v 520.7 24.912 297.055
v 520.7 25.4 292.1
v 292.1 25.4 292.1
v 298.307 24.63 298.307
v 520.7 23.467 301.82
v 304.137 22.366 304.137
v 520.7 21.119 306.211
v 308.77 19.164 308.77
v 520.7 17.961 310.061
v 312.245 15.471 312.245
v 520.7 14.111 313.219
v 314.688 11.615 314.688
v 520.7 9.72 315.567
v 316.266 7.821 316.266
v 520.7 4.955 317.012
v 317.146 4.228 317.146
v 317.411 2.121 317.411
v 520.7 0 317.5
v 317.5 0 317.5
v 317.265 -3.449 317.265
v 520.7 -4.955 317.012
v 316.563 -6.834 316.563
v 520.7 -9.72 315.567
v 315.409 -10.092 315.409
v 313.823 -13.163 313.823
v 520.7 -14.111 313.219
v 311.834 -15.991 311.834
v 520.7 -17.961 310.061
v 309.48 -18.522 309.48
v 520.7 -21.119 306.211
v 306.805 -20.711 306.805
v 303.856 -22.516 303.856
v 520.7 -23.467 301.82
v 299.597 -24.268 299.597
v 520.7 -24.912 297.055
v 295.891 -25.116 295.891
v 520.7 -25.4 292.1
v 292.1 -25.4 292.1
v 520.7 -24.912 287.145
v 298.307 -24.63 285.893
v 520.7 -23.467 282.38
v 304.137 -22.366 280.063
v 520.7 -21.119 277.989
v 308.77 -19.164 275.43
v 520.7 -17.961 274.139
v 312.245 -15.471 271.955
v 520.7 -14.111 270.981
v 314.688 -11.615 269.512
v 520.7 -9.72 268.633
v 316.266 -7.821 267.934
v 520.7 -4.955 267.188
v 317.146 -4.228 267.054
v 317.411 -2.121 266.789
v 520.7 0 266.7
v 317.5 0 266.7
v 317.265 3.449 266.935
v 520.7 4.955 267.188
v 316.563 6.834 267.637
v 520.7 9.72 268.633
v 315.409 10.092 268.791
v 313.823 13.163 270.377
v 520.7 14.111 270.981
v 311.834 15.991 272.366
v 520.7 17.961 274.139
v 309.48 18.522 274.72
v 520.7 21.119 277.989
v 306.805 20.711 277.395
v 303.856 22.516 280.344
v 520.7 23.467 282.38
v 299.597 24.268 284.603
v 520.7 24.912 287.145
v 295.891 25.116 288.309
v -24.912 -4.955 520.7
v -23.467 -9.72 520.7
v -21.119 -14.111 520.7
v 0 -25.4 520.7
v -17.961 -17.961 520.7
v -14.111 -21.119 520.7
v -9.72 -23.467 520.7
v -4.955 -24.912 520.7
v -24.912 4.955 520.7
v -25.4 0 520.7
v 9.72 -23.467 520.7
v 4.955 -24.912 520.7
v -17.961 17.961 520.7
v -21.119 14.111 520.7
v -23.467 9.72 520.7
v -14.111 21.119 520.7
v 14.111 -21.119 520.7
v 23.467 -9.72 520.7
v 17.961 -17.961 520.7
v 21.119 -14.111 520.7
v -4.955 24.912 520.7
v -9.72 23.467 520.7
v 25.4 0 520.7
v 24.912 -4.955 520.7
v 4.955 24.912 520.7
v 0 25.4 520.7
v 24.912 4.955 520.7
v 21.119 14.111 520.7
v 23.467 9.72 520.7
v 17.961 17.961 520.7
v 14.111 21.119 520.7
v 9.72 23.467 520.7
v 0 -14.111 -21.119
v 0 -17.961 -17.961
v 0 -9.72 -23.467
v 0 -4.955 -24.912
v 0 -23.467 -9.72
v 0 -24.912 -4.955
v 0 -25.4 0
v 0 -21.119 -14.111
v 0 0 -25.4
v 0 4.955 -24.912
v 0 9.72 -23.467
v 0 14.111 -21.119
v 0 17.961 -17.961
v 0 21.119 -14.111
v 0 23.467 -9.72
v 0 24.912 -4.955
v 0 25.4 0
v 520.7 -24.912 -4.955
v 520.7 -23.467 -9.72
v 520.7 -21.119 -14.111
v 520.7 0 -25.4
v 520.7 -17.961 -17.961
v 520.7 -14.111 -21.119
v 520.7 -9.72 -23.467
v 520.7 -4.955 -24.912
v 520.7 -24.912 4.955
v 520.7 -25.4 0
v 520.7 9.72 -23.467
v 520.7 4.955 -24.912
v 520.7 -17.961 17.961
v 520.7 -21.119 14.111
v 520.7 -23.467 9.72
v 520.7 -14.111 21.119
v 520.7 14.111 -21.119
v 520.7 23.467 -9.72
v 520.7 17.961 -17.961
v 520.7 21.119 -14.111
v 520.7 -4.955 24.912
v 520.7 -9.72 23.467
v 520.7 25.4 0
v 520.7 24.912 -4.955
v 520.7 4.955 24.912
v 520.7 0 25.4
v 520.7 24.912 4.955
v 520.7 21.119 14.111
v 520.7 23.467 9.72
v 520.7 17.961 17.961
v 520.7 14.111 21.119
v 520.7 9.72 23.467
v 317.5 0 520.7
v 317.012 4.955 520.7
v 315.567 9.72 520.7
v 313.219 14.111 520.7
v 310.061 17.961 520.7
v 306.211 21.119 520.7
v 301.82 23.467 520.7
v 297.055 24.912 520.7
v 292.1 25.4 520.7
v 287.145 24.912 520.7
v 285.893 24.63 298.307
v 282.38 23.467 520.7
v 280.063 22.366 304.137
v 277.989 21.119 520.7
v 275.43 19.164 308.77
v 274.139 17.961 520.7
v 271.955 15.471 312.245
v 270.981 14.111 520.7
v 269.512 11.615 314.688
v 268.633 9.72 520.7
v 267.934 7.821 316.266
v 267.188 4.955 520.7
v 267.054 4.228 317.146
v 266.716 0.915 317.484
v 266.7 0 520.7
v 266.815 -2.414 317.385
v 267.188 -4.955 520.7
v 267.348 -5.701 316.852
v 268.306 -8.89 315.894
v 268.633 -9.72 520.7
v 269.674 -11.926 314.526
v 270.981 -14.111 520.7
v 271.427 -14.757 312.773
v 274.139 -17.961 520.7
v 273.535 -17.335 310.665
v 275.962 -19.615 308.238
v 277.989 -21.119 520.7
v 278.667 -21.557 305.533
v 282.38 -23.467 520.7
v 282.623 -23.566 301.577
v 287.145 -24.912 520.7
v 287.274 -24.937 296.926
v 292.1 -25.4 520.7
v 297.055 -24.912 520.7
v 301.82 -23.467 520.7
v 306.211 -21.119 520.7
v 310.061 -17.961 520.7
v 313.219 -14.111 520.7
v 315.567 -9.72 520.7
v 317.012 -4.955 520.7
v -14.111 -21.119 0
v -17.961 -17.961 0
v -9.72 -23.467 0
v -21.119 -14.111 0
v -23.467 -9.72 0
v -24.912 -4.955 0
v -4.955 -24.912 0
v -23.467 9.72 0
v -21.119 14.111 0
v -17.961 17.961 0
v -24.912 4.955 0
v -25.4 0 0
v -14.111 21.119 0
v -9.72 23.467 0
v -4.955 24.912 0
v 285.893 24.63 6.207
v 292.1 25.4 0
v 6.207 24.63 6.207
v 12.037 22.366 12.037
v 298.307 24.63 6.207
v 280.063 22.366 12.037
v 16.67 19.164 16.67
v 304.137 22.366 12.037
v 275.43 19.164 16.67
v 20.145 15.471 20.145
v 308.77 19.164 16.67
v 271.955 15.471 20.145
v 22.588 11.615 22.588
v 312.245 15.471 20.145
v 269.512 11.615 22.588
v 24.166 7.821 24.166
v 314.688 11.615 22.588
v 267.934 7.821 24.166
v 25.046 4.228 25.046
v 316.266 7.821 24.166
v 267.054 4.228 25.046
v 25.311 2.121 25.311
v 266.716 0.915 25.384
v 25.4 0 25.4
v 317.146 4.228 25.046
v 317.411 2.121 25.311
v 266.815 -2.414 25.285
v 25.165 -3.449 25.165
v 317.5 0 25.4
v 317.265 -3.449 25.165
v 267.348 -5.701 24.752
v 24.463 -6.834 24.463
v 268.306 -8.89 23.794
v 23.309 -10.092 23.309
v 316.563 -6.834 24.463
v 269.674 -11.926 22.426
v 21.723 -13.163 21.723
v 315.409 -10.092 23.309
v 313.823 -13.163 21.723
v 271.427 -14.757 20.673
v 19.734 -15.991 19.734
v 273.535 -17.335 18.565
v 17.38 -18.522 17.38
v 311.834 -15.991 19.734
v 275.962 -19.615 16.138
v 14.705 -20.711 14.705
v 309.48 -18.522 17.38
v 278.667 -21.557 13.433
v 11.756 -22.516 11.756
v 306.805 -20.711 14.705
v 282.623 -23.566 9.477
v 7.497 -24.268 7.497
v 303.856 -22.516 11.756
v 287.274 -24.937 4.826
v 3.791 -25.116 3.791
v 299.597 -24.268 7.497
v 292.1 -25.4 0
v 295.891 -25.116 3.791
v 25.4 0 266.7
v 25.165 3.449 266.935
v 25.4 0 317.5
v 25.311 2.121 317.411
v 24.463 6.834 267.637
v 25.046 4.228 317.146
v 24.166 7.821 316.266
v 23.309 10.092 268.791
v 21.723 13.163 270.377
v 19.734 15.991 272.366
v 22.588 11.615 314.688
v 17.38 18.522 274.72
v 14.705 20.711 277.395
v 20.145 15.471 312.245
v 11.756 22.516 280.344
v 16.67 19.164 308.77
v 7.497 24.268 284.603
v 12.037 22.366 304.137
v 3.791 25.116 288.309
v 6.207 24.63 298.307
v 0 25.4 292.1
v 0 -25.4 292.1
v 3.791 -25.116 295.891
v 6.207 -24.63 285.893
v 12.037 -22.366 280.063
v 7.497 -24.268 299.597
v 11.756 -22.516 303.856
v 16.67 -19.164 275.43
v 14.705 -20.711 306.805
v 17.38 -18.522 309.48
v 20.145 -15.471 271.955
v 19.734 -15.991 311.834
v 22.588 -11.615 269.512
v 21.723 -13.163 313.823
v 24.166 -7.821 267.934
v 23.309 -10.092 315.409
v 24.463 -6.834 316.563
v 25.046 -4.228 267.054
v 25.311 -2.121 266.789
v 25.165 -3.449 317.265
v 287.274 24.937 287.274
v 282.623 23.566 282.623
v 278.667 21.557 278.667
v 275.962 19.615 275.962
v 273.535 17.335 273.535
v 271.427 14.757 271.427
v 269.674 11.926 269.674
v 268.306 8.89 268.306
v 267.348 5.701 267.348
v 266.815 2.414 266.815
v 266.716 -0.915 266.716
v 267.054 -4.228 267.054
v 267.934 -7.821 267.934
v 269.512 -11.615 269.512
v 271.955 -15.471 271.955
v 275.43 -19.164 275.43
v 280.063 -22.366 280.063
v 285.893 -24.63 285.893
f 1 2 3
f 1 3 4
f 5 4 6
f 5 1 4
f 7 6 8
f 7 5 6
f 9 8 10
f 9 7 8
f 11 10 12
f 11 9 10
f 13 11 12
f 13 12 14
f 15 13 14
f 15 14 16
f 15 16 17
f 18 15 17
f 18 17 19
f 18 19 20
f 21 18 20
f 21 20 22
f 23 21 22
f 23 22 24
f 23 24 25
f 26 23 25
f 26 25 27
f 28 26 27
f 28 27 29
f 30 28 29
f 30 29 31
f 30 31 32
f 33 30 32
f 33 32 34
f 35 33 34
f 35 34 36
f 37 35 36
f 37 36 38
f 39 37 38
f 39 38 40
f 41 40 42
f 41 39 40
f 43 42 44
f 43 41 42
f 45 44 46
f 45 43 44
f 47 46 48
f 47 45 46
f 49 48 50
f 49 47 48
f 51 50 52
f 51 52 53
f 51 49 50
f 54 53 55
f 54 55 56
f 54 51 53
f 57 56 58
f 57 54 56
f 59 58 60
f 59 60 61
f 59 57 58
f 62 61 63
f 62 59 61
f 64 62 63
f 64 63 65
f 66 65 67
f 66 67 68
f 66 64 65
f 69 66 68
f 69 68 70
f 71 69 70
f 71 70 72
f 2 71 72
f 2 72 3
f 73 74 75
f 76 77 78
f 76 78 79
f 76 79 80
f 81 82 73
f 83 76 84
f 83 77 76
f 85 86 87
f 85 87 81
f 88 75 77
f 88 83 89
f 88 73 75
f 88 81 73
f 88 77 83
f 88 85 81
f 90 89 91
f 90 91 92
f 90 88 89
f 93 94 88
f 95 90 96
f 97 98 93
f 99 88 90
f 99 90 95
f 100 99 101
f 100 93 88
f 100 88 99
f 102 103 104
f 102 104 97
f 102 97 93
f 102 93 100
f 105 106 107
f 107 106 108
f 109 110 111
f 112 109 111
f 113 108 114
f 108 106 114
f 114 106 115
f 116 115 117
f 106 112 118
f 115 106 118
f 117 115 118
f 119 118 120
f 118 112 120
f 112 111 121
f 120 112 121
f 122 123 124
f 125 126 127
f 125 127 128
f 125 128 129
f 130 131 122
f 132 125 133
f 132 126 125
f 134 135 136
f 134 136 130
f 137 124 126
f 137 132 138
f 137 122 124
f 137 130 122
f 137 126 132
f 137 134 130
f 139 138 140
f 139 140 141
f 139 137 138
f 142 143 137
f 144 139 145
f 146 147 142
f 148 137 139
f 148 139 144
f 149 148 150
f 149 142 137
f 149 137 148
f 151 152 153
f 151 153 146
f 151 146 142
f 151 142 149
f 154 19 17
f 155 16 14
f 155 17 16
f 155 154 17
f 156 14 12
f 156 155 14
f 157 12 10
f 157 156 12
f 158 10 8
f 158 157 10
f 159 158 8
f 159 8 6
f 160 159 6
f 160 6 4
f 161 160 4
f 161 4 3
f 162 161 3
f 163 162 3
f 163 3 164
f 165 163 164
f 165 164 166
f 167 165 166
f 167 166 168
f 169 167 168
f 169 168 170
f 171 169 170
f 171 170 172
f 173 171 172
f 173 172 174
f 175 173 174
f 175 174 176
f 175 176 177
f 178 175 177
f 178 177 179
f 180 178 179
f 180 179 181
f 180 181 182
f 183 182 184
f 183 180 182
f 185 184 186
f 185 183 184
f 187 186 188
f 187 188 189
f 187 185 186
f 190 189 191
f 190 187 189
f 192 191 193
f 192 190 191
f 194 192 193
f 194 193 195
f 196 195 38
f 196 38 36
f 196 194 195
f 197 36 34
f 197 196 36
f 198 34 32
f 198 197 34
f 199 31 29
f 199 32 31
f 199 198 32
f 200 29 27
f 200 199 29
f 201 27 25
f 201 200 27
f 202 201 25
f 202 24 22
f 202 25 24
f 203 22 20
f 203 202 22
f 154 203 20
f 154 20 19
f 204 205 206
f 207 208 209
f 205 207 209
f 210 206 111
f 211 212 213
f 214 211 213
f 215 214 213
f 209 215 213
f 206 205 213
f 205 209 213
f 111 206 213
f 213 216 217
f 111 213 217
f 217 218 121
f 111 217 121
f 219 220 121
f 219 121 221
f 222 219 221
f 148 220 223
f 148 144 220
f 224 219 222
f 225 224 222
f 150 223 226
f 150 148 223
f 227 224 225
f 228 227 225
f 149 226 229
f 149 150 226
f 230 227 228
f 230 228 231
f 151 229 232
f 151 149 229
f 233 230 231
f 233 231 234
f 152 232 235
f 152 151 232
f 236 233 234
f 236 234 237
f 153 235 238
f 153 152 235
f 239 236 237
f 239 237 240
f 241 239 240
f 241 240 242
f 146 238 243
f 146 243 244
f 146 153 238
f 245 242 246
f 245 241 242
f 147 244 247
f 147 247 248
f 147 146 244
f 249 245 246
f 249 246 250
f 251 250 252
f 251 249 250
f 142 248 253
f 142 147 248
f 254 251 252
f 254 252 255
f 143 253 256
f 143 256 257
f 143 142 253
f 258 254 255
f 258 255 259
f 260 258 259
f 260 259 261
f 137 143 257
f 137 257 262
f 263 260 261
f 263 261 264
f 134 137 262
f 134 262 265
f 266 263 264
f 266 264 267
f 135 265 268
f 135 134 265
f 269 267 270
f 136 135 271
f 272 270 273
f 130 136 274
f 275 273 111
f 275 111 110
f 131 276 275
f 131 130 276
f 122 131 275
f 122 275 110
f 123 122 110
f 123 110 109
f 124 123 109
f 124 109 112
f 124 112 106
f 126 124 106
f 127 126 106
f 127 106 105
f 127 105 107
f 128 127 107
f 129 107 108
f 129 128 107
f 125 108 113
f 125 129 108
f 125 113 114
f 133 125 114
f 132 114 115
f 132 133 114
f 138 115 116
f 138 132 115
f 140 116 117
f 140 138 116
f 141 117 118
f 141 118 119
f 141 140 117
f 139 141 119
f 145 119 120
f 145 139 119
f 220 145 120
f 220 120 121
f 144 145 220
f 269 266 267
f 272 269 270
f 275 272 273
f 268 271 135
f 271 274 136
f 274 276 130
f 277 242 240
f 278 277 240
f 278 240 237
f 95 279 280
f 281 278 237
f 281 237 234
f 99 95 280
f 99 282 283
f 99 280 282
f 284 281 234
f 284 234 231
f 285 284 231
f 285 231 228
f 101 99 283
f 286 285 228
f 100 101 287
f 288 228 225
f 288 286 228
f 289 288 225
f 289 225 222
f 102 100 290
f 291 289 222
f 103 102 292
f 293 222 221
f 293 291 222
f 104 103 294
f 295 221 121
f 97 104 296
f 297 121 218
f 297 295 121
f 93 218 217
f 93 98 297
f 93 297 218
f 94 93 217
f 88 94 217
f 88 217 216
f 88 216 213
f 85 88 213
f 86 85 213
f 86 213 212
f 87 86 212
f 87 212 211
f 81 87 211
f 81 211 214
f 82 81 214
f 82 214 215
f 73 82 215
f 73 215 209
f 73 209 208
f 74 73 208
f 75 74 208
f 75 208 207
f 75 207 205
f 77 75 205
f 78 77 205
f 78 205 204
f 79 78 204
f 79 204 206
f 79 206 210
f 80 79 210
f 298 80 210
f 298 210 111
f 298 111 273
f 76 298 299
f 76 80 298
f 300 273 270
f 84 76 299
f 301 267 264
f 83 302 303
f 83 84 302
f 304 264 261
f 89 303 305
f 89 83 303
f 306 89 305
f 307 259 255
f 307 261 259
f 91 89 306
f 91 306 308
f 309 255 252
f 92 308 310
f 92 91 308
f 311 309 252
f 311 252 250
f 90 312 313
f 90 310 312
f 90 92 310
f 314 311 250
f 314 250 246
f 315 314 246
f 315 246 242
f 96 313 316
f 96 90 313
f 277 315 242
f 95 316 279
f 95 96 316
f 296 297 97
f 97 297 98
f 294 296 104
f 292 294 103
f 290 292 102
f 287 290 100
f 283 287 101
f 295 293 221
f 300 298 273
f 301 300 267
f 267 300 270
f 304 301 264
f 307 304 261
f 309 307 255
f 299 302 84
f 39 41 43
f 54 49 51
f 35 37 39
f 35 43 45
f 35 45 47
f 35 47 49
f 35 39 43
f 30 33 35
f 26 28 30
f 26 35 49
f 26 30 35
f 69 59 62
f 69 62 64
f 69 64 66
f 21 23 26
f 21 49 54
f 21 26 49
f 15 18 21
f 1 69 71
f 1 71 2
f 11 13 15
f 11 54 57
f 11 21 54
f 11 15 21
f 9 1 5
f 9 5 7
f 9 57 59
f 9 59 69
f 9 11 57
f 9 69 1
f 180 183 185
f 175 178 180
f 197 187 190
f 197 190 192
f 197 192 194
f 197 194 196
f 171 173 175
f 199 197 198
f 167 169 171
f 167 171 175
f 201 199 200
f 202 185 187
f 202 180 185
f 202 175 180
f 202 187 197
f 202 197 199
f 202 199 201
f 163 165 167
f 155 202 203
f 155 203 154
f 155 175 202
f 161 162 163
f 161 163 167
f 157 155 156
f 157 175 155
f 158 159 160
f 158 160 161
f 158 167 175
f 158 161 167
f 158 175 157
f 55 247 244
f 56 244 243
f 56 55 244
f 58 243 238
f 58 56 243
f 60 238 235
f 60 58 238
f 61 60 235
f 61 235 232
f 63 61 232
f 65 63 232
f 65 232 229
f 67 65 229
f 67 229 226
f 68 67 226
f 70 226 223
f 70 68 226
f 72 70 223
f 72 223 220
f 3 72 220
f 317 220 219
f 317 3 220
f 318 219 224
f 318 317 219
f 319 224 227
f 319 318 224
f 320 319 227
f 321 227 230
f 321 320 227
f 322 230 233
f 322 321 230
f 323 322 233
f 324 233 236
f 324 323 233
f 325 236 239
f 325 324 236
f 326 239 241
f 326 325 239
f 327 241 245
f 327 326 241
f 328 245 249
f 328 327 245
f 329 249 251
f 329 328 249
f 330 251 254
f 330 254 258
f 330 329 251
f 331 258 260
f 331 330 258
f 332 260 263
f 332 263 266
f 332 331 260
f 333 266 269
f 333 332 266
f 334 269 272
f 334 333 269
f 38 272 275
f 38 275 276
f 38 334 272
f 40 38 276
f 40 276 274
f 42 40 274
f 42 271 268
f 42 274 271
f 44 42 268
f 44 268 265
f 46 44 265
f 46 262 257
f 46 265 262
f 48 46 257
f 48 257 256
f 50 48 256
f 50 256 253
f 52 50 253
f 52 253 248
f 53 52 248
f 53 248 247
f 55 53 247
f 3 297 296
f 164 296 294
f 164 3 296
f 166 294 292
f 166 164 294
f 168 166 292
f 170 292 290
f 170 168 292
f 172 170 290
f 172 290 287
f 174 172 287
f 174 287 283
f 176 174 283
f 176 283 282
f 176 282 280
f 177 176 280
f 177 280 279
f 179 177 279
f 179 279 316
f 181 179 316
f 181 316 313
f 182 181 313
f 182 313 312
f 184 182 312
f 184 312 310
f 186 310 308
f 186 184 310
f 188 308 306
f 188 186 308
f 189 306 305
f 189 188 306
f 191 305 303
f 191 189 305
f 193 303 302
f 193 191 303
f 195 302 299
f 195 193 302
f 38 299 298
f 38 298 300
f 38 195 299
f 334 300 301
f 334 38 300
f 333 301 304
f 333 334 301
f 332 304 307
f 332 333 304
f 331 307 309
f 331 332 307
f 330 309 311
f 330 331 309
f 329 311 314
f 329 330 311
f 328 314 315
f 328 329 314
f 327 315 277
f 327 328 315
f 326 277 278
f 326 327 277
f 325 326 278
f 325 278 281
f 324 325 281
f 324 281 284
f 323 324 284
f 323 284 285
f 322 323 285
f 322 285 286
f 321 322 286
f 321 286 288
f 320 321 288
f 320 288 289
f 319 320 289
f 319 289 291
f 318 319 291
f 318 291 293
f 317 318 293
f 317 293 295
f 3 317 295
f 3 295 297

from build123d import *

# Parameters (mm, degrees)
F7_R     = 25.4
F8_DEPTH = 520.7
F6_R     = 25.4
F9_DEPTH = 520.7


with BuildPart() as f8:
    # F7 (on offset) → F8 (new body, through all)
    with BuildSketch(Plane.YZ.offset(520.7)):
        Circle(F7_R)
    extrude(amount=-F8_DEPTH)



with BuildPart() as f8b:
    # F7 (on offset) → F8, piece 2 (new body, through all)
    with BuildSketch(Plane.YZ.offset(520.7)):
        with Locations((0, 292.1)):
            Circle(F7_R)
    extrude(amount=-F8_DEPTH)


with BuildPart() as f8_1:
    add(f8.part)

    add(f8b.part)  # F9 merges F8b
    # F6 (on offset) → F9 (join, through all)
    with BuildSketch(Plane.XY.offset(520.7)):
        Circle(F6_R)
        with Locations((292.1, 0)):
            Circle(F6_R)
    extrude(amount=-F9_DEPTH)


solid = f8_1.part
